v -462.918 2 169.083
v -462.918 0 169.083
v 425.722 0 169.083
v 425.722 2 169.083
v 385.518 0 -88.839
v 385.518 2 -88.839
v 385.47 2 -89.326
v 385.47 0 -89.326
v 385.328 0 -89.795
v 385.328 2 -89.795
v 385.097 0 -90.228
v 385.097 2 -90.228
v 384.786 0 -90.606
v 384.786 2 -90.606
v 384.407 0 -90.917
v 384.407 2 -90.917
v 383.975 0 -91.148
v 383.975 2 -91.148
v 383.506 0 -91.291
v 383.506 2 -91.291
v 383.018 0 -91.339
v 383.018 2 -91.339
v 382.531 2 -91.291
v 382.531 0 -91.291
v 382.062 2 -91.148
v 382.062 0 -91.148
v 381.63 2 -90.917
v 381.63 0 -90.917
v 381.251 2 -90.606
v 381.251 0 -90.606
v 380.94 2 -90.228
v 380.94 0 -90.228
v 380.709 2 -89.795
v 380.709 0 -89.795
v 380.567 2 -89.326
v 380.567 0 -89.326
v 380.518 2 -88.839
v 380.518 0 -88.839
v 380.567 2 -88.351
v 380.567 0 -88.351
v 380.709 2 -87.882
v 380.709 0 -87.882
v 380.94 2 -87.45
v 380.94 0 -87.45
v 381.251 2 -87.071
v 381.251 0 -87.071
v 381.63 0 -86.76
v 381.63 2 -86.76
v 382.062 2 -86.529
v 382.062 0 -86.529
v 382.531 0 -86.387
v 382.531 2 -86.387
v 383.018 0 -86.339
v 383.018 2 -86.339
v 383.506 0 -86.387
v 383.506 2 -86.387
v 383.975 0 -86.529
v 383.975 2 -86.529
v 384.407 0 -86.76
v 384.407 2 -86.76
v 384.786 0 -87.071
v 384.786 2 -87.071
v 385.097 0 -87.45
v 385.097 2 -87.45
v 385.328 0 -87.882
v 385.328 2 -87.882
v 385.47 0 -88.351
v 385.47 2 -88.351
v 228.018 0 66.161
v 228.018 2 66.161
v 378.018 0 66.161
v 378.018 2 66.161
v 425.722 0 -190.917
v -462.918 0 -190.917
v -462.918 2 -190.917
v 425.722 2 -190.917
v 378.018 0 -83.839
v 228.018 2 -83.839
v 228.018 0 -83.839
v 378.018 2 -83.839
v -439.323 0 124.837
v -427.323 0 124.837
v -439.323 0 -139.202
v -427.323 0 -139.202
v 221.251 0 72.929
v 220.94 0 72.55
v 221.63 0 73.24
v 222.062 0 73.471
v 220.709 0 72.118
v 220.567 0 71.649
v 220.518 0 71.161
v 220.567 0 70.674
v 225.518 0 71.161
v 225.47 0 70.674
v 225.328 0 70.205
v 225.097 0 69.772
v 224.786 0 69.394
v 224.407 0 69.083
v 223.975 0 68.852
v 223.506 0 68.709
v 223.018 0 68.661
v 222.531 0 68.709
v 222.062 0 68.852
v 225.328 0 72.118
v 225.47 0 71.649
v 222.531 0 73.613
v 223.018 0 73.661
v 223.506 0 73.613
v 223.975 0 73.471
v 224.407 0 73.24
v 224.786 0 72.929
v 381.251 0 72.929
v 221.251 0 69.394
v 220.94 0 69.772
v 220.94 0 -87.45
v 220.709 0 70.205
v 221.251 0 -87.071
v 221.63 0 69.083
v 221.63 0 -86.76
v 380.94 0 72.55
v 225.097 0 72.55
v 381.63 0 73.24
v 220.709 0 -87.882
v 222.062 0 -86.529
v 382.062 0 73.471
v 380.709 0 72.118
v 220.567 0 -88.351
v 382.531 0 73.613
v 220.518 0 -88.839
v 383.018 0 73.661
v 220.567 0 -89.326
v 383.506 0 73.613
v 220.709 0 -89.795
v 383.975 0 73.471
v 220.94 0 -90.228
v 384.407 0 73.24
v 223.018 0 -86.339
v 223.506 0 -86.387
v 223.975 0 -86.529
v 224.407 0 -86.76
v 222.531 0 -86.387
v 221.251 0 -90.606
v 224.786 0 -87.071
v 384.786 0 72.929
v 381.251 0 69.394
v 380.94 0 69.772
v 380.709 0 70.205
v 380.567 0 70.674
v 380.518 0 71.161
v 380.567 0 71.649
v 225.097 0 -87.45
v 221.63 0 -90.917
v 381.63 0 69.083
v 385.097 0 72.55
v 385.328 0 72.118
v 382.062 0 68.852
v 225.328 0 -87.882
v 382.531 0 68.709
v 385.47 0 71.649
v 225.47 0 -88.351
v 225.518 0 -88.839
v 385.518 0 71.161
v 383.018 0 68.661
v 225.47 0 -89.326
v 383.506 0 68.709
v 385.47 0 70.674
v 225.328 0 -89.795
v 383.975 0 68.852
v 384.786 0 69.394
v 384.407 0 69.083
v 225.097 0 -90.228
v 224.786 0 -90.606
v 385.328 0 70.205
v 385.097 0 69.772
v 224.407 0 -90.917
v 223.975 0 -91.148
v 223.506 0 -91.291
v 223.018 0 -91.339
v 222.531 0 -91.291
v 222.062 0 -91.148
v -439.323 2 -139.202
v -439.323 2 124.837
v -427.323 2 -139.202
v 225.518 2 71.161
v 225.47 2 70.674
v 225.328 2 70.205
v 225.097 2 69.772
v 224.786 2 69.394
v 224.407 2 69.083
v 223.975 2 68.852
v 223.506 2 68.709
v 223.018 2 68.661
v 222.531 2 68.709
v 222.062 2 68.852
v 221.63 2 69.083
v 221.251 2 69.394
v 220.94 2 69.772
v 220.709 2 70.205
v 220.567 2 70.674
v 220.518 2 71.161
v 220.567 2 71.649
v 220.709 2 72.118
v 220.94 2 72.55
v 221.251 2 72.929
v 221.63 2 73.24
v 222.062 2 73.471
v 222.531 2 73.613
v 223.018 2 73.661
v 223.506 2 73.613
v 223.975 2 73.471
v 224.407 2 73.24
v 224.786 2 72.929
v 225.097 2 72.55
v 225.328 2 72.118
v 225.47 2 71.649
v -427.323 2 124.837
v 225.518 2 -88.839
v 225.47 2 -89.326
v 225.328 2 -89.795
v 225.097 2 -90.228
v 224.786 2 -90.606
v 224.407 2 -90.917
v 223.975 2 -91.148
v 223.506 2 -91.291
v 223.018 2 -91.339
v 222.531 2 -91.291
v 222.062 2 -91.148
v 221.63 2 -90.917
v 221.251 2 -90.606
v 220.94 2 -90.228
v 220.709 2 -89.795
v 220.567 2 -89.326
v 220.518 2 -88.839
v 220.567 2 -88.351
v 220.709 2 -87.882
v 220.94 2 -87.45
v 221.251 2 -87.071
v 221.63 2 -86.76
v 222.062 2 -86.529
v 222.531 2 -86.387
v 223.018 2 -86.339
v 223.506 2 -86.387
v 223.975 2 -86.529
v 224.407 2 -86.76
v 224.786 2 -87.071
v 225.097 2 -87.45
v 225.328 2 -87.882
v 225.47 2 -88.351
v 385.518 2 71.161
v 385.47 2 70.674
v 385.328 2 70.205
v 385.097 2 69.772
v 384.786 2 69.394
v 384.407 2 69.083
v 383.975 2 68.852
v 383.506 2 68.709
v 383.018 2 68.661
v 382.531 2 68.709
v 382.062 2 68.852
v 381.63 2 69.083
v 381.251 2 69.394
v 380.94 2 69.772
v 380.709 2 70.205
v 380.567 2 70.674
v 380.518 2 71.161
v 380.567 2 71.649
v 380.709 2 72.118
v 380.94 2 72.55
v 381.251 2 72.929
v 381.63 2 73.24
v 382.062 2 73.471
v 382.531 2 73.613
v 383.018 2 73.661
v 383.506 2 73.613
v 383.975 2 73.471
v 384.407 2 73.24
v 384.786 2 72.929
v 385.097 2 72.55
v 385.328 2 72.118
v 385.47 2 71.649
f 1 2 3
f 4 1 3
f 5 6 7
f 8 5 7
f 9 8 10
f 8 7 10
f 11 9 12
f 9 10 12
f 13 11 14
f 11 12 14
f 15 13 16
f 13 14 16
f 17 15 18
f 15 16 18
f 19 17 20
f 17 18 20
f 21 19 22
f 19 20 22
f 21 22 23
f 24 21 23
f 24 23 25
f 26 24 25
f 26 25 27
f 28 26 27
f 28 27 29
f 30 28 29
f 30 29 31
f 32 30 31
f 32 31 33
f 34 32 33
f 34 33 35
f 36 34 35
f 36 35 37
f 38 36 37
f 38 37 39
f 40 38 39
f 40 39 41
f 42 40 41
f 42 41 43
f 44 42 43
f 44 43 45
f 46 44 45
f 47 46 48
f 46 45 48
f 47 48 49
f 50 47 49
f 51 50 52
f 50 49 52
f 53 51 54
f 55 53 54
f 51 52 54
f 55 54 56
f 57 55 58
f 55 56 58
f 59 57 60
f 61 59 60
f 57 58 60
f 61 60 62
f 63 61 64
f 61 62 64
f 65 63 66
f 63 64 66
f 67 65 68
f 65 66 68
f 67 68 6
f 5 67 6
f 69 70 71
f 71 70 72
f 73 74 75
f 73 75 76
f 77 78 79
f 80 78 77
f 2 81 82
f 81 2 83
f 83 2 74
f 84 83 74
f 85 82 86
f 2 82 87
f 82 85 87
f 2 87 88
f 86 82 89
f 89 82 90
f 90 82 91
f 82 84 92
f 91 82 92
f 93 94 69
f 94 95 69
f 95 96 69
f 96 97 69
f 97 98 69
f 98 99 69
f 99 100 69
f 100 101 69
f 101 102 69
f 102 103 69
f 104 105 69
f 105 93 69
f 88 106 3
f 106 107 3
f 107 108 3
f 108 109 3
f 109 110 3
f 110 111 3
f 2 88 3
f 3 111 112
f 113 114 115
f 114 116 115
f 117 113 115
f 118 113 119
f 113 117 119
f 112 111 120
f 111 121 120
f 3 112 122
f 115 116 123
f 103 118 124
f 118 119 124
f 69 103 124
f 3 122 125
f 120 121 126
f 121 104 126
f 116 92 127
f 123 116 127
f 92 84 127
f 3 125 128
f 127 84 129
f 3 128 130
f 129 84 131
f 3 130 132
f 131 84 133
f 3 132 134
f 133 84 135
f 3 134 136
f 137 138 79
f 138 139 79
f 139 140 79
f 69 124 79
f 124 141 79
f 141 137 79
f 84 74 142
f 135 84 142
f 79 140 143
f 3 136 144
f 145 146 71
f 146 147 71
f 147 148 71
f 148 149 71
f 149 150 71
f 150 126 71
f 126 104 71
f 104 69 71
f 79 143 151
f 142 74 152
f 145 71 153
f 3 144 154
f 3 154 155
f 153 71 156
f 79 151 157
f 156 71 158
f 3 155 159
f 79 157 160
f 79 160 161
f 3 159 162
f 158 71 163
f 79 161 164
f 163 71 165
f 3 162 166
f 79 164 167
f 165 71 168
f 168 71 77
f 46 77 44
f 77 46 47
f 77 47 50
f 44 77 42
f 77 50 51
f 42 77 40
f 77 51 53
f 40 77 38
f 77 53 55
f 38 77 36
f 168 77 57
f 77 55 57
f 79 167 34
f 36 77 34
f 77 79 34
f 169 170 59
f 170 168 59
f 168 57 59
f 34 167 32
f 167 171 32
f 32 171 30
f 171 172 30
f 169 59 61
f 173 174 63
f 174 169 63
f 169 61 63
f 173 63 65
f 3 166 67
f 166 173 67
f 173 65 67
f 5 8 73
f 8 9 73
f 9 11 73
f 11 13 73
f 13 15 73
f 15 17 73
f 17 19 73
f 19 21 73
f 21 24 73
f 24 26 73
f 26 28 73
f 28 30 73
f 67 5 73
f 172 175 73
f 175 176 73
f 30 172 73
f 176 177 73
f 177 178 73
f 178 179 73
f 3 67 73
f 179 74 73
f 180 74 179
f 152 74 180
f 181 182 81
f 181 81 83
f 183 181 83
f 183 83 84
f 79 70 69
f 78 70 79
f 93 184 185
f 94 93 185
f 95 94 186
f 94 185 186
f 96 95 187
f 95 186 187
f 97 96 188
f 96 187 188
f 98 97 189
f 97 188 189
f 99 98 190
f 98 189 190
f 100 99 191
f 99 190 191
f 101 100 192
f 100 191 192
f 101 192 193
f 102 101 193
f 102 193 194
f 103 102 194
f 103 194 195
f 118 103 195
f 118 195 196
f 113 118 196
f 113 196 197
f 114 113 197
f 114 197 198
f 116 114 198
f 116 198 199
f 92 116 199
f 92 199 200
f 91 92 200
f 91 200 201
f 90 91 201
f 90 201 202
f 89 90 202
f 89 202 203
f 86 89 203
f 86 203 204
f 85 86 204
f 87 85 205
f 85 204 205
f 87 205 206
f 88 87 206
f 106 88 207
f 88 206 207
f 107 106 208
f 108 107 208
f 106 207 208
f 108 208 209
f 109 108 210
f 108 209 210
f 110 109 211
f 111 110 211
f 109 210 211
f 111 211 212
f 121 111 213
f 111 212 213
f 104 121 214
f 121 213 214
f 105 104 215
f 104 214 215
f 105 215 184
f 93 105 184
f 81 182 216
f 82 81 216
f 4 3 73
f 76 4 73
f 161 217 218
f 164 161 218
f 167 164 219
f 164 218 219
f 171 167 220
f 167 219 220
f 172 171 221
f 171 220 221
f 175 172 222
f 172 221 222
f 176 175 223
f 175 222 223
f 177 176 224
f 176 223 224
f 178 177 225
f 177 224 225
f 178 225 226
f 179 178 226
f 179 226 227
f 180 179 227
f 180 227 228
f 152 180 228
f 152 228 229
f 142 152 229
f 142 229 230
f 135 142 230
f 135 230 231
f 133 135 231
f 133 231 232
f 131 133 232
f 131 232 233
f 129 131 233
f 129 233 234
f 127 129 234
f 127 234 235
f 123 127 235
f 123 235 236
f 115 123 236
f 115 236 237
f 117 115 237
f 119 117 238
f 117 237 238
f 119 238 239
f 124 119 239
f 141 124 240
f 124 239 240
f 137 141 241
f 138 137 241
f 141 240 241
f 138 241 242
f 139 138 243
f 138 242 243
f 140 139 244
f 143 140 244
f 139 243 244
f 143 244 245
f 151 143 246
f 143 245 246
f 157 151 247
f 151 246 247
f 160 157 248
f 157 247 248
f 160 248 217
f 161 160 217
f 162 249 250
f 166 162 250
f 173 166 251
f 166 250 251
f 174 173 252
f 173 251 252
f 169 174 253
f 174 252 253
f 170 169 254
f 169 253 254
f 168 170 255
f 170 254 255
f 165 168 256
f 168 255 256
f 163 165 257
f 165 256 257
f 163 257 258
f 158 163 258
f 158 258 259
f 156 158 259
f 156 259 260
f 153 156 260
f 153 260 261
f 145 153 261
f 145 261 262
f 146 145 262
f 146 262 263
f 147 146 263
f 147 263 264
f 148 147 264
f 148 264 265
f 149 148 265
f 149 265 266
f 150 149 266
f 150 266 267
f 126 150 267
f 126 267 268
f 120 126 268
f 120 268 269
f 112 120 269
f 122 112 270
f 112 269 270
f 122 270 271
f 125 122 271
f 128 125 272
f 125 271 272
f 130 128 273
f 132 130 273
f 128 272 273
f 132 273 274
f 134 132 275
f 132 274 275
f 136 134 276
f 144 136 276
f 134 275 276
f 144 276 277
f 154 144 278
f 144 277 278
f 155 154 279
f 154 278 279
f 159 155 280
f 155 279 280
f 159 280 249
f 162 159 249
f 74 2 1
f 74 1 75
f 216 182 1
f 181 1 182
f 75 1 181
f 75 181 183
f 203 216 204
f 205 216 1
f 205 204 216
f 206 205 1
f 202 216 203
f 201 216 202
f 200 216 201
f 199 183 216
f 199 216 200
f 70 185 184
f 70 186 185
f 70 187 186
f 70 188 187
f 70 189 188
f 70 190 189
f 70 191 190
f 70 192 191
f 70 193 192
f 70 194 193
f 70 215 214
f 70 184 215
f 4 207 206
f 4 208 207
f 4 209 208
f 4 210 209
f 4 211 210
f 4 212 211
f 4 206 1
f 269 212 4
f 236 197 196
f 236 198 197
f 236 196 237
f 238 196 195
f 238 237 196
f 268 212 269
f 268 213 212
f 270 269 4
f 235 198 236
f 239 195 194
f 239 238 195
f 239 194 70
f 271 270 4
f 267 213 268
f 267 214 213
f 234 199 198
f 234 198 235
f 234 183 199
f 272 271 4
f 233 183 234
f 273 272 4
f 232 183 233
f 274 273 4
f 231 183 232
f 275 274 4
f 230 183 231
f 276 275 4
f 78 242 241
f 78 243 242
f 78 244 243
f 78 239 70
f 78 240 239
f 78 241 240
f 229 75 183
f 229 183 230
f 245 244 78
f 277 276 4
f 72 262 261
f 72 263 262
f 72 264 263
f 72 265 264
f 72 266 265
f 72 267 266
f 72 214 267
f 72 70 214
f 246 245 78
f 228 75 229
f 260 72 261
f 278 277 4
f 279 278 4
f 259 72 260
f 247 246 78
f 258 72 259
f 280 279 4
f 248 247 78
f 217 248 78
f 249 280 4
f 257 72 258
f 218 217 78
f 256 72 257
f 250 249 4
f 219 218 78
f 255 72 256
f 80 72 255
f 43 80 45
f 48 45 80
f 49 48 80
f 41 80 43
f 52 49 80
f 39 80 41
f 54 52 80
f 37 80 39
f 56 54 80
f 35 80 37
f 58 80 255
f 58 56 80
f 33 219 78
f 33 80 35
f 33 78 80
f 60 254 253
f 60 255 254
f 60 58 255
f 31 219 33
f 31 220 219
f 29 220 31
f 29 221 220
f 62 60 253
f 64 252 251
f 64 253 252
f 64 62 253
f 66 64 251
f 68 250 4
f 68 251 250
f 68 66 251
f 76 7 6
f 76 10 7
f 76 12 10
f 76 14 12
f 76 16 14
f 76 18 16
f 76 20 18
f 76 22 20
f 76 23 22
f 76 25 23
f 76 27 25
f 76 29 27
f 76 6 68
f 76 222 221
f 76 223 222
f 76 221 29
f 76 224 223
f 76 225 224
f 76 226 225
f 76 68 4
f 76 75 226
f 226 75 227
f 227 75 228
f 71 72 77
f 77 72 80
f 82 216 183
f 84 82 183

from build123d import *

# Parameters (mm, degrees)
SKETCH1_W           = 888.64
SKETCH1_H           = 360
BOSS_EXTRUDE1_DEPTH = 2
SKETCH8_W           = 12
SKETCH8_H           = 264.038311476
CUT_EXTRUDE6_DEPTH  = 10
SKETCH9_R           = 2.5
SKETCH9_W           = 150
SKETCH9_H           = 150
CUT_EXTRUDE7_DEPTH  = 10


with BuildPart() as part:
    # Sketch1 → Boss-Extrude1 (new body)
    with BuildSketch(Plane(origin=(0, 0, 0), x_dir=(1, 0, 0), z_dir=(0, 1, 0))):
        with Locations((-18.597777778, 10.916666667)):
            Rectangle(SKETCH1_W, SKETCH1_H)
    extrude(amount=BOSS_EXTRUDE1_DEPTH)

    # Sketch8 → Cut-Extrude6 (cut)
    with BuildSketch(Plane(origin=(0, 2, 0), x_dir=(1, 0, 0), z_dir=(0, 1, 0))):
        with Locations((-433.323058676, 7.182390304)):
            Rectangle(SKETCH8_W, SKETCH8_H)
    extrude(amount=-CUT_EXTRUDE6_DEPTH, mode=Mode.SUBTRACT)

    # Sketch9 → Cut-Extrude7 (cut)
    with BuildSketch(Plane(origin=(0, 2, 0), x_dir=(1, 0, 0), z_dir=(0, 1, 0))):
        with Locations((223.018484234, 88.838711225)):
            Circle(SKETCH9_R)
        with Locations((383.018484234, 88.838711225)):
            Circle(SKETCH9_R)
        with Locations((383.018484234, -71.161288775)):
            Circle(SKETCH9_R)
        with Locations((223.018484234, -71.161288775)):
            Circle(SKETCH9_R)
        with Locations((303.018484234, 8.838711225)):
            Rectangle(SKETCH9_W, SKETCH9_H)
    extrude(amount=-CUT_EXTRUDE7_DEPTH, mode=Mode.SUBTRACT)


solid = part.part
